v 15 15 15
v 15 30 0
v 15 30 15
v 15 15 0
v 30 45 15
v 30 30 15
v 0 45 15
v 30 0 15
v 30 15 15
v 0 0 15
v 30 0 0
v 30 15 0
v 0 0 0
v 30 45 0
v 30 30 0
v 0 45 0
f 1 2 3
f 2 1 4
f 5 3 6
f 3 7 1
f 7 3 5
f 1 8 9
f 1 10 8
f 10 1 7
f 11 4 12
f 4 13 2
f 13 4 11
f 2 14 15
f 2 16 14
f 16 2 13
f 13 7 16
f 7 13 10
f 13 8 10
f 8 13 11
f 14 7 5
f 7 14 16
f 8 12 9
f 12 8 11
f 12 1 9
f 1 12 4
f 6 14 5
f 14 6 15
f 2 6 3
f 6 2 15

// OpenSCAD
// Fongo piece 4: Gate. GPL-3.0; see README.txt.
// All cube positions derive from the canonical catalogue. z points up.
unit = 15; // mm, scale all pieces AND cards together
positions = [[0,0,0],[0,1,0],[0,2,0],[1,0,0],[1,2,0]];
union() { for (p = positions) translate(p * unit) cube([unit, unit, unit]); }
